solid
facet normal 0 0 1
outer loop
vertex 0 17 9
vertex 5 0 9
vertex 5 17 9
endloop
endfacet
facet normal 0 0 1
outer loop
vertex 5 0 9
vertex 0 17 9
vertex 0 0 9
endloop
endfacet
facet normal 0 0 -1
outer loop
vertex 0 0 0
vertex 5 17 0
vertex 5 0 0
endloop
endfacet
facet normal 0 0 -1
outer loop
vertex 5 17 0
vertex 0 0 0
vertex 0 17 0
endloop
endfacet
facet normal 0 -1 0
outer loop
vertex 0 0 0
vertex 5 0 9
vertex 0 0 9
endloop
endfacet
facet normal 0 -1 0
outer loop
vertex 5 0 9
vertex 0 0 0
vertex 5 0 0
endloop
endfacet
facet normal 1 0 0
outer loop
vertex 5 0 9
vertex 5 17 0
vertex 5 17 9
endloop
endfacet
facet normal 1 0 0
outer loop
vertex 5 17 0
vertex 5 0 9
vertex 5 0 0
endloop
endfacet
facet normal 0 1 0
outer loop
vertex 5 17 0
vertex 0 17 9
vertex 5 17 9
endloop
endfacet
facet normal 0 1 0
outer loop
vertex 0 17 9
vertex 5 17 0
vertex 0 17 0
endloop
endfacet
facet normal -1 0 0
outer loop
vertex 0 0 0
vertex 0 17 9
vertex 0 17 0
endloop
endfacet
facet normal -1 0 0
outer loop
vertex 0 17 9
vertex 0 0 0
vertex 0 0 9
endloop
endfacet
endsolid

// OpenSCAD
// Generated by SolidPython 1.0.1 on 2020-07-29 00:46:54


cube(size = [5, 17, 9]);
/***********************************************
*********      SolidPython code:      **********
************************************************
 
# import packages: SolidPython
from solid import *
from solid.utils import *
from itertools import chain, combinations, permutations


class Resize:

    def __init__(self, scad_file):
        self.scad_file = scad_file
        #self.scad_file = import_scad(scad_file)
        # cone/cylinder param:
        self.r1 = 0
        self.r2 = 0
        self.h = 0
        # rectangular prism param:
        self.w = 0
        self.l = 0
        # ellipse param:
        self.r = 0

    # import OpenScad code (file name corresponds to shape)


    # classify shape + parameters
    def assign(self, param1, param2, param3):
        if self.scad_file == 'cone.scad':
            self.r1 = param1
            self.r2 = param2
            self.h = param3
        elif self.scad_file == 'cylinder.scad':
            self.r1 = param1
            self.r2 = param2
            self.h = param3
        elif self.scad_file == 'rectangularPrism.scad':
            self.h = param1
            self.l = param2
            self.w = param3
        else:
            self.r = param1
            self.h = param2

    # resize parameters
    def iterate(self):
        x = range(3, 20, 2)
        i = 1
        if self.scad_file == 'cone.scad':
            tempList = list(permutations(x, 2))
            for temp in tempList:
                param1 = temp[0]
                param2 = temp[1]
                filepath = 'produced_scad_files/' + 'cone' + str(param1) + '_' + str(param2) + '_' + '.scad'
                scad_render_to_file(cylinder(h=param1, r1=param2, r2=0), filepath)

        elif self.scad_file == 'cylinder.scad':
            tempList = list(permutations(x, 3))
            for temp in tempList:
                param1 = temp[0]
                param2 = temp[1]
                filepath = 'produced_scad_files/' + 'cylinder' + str(param1) + '_' + str(param2) + '_' + '.scad'
                scad_render_to_file(cylinder(h=param1, r1=param2, r2=param2), filepath)

        elif self.scad_file == 'rectangularPrism.scad':
            tempList = list(permutations(x, 3))
            for temp in tempList:
                param1 = temp[0]
                param2 = temp[1]
                param3 = temp[2]
                filepath = 'produced_scad_files/' + 'rectangularPrism' + str(param1) + '_' + str(param2) + '_' + str(
                    param3) + '.scad'
                scad_render_to_file(cube(size=(param1, param2, param3)), filepath)

        elif self.scad_file == 'ellipse.scad':
            tempList = list(permutations(x, 4))
            for temp in tempList:
                param1 = temp[0]
                param2 = temp[1]
                param3 = temp[2]
                param4 = temp[3]
                filepath = 'produced_scad_files/' + 'ellipse' + str(param1) + '_' + str(param2) + '_' + str(param3) + '_' + str(param4) + '.scad'
                scad_render_to_file(scale([param1, param2, param3])(sphere(r=param4)), filepath)

    def render_to_scadfile(self):
        scad_render_to_file(scad, 'example.scad') 
 
************************************************/
